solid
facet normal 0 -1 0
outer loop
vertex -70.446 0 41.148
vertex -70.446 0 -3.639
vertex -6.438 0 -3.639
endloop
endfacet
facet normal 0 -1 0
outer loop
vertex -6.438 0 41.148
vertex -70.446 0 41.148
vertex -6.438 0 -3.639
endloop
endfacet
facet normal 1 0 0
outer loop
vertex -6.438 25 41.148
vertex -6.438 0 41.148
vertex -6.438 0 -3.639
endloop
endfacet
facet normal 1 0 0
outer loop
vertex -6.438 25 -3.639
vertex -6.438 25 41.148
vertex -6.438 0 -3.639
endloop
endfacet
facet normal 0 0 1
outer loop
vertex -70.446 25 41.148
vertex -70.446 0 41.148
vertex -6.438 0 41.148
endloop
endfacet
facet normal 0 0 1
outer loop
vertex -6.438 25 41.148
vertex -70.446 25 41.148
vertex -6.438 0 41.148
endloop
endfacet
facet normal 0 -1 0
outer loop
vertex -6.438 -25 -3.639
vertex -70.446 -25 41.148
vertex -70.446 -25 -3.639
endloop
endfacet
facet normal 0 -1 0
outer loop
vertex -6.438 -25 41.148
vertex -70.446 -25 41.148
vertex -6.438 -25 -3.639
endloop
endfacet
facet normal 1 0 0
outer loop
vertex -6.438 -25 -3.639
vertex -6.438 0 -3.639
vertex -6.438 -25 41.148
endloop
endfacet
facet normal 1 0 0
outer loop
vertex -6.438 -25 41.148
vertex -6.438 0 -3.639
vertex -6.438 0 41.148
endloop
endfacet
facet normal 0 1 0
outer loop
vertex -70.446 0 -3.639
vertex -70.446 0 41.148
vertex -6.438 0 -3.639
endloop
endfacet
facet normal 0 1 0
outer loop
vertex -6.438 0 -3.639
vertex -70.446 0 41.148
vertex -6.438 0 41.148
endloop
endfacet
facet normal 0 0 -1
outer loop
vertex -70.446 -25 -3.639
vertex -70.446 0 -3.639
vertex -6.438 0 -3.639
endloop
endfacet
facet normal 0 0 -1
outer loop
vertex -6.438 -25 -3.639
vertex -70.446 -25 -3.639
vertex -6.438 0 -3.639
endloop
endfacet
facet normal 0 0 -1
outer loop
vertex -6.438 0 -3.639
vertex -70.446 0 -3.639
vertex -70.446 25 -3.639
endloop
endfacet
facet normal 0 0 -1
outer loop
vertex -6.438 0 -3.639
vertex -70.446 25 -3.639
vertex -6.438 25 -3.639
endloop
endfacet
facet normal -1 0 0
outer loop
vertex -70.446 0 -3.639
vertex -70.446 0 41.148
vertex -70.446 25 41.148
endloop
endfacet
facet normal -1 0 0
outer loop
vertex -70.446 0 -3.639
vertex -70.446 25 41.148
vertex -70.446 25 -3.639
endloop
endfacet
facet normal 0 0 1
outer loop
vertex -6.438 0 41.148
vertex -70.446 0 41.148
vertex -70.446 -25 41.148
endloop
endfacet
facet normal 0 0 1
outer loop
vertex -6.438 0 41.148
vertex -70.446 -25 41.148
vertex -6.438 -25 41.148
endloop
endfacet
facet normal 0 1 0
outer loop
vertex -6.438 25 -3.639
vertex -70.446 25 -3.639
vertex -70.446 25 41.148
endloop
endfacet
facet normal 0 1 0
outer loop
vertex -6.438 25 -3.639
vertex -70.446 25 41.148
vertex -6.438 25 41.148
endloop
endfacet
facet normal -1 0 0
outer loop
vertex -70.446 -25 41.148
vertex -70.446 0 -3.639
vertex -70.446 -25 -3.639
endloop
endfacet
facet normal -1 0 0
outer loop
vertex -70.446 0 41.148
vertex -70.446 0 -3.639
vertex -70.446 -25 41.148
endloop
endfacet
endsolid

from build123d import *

# Parameters (mm, degrees)
F0_W      = 64.007706
F0_H      = 44.786731
F1_DEPTH  = 25
F1_FACE_W = 64.007706
F1_FACE_H = 44.786732
F2_DEPTH  = 25


with BuildPart() as f1:
    # F0 (on Front) → F1 (new body)
    with BuildSketch(Plane.XZ):
        with Locations((-38.441945, 18.754443)):
            Rectangle(F0_W, F0_H)
    extrude(amount=F1_DEPTH)


with BuildPart() as f2:
    # F1_face (on face) → F2 (new body)
    with BuildSketch(Plane(origin=(-38.441945, 0, 18.754444), x_dir=(1, 0, 0), z_dir=(0, 1, 0))):
        Rectangle(F1_FACE_W, F1_FACE_H)
    extrude(amount=F2_DEPTH)


solid = Compound([f1.part, f2.part])
